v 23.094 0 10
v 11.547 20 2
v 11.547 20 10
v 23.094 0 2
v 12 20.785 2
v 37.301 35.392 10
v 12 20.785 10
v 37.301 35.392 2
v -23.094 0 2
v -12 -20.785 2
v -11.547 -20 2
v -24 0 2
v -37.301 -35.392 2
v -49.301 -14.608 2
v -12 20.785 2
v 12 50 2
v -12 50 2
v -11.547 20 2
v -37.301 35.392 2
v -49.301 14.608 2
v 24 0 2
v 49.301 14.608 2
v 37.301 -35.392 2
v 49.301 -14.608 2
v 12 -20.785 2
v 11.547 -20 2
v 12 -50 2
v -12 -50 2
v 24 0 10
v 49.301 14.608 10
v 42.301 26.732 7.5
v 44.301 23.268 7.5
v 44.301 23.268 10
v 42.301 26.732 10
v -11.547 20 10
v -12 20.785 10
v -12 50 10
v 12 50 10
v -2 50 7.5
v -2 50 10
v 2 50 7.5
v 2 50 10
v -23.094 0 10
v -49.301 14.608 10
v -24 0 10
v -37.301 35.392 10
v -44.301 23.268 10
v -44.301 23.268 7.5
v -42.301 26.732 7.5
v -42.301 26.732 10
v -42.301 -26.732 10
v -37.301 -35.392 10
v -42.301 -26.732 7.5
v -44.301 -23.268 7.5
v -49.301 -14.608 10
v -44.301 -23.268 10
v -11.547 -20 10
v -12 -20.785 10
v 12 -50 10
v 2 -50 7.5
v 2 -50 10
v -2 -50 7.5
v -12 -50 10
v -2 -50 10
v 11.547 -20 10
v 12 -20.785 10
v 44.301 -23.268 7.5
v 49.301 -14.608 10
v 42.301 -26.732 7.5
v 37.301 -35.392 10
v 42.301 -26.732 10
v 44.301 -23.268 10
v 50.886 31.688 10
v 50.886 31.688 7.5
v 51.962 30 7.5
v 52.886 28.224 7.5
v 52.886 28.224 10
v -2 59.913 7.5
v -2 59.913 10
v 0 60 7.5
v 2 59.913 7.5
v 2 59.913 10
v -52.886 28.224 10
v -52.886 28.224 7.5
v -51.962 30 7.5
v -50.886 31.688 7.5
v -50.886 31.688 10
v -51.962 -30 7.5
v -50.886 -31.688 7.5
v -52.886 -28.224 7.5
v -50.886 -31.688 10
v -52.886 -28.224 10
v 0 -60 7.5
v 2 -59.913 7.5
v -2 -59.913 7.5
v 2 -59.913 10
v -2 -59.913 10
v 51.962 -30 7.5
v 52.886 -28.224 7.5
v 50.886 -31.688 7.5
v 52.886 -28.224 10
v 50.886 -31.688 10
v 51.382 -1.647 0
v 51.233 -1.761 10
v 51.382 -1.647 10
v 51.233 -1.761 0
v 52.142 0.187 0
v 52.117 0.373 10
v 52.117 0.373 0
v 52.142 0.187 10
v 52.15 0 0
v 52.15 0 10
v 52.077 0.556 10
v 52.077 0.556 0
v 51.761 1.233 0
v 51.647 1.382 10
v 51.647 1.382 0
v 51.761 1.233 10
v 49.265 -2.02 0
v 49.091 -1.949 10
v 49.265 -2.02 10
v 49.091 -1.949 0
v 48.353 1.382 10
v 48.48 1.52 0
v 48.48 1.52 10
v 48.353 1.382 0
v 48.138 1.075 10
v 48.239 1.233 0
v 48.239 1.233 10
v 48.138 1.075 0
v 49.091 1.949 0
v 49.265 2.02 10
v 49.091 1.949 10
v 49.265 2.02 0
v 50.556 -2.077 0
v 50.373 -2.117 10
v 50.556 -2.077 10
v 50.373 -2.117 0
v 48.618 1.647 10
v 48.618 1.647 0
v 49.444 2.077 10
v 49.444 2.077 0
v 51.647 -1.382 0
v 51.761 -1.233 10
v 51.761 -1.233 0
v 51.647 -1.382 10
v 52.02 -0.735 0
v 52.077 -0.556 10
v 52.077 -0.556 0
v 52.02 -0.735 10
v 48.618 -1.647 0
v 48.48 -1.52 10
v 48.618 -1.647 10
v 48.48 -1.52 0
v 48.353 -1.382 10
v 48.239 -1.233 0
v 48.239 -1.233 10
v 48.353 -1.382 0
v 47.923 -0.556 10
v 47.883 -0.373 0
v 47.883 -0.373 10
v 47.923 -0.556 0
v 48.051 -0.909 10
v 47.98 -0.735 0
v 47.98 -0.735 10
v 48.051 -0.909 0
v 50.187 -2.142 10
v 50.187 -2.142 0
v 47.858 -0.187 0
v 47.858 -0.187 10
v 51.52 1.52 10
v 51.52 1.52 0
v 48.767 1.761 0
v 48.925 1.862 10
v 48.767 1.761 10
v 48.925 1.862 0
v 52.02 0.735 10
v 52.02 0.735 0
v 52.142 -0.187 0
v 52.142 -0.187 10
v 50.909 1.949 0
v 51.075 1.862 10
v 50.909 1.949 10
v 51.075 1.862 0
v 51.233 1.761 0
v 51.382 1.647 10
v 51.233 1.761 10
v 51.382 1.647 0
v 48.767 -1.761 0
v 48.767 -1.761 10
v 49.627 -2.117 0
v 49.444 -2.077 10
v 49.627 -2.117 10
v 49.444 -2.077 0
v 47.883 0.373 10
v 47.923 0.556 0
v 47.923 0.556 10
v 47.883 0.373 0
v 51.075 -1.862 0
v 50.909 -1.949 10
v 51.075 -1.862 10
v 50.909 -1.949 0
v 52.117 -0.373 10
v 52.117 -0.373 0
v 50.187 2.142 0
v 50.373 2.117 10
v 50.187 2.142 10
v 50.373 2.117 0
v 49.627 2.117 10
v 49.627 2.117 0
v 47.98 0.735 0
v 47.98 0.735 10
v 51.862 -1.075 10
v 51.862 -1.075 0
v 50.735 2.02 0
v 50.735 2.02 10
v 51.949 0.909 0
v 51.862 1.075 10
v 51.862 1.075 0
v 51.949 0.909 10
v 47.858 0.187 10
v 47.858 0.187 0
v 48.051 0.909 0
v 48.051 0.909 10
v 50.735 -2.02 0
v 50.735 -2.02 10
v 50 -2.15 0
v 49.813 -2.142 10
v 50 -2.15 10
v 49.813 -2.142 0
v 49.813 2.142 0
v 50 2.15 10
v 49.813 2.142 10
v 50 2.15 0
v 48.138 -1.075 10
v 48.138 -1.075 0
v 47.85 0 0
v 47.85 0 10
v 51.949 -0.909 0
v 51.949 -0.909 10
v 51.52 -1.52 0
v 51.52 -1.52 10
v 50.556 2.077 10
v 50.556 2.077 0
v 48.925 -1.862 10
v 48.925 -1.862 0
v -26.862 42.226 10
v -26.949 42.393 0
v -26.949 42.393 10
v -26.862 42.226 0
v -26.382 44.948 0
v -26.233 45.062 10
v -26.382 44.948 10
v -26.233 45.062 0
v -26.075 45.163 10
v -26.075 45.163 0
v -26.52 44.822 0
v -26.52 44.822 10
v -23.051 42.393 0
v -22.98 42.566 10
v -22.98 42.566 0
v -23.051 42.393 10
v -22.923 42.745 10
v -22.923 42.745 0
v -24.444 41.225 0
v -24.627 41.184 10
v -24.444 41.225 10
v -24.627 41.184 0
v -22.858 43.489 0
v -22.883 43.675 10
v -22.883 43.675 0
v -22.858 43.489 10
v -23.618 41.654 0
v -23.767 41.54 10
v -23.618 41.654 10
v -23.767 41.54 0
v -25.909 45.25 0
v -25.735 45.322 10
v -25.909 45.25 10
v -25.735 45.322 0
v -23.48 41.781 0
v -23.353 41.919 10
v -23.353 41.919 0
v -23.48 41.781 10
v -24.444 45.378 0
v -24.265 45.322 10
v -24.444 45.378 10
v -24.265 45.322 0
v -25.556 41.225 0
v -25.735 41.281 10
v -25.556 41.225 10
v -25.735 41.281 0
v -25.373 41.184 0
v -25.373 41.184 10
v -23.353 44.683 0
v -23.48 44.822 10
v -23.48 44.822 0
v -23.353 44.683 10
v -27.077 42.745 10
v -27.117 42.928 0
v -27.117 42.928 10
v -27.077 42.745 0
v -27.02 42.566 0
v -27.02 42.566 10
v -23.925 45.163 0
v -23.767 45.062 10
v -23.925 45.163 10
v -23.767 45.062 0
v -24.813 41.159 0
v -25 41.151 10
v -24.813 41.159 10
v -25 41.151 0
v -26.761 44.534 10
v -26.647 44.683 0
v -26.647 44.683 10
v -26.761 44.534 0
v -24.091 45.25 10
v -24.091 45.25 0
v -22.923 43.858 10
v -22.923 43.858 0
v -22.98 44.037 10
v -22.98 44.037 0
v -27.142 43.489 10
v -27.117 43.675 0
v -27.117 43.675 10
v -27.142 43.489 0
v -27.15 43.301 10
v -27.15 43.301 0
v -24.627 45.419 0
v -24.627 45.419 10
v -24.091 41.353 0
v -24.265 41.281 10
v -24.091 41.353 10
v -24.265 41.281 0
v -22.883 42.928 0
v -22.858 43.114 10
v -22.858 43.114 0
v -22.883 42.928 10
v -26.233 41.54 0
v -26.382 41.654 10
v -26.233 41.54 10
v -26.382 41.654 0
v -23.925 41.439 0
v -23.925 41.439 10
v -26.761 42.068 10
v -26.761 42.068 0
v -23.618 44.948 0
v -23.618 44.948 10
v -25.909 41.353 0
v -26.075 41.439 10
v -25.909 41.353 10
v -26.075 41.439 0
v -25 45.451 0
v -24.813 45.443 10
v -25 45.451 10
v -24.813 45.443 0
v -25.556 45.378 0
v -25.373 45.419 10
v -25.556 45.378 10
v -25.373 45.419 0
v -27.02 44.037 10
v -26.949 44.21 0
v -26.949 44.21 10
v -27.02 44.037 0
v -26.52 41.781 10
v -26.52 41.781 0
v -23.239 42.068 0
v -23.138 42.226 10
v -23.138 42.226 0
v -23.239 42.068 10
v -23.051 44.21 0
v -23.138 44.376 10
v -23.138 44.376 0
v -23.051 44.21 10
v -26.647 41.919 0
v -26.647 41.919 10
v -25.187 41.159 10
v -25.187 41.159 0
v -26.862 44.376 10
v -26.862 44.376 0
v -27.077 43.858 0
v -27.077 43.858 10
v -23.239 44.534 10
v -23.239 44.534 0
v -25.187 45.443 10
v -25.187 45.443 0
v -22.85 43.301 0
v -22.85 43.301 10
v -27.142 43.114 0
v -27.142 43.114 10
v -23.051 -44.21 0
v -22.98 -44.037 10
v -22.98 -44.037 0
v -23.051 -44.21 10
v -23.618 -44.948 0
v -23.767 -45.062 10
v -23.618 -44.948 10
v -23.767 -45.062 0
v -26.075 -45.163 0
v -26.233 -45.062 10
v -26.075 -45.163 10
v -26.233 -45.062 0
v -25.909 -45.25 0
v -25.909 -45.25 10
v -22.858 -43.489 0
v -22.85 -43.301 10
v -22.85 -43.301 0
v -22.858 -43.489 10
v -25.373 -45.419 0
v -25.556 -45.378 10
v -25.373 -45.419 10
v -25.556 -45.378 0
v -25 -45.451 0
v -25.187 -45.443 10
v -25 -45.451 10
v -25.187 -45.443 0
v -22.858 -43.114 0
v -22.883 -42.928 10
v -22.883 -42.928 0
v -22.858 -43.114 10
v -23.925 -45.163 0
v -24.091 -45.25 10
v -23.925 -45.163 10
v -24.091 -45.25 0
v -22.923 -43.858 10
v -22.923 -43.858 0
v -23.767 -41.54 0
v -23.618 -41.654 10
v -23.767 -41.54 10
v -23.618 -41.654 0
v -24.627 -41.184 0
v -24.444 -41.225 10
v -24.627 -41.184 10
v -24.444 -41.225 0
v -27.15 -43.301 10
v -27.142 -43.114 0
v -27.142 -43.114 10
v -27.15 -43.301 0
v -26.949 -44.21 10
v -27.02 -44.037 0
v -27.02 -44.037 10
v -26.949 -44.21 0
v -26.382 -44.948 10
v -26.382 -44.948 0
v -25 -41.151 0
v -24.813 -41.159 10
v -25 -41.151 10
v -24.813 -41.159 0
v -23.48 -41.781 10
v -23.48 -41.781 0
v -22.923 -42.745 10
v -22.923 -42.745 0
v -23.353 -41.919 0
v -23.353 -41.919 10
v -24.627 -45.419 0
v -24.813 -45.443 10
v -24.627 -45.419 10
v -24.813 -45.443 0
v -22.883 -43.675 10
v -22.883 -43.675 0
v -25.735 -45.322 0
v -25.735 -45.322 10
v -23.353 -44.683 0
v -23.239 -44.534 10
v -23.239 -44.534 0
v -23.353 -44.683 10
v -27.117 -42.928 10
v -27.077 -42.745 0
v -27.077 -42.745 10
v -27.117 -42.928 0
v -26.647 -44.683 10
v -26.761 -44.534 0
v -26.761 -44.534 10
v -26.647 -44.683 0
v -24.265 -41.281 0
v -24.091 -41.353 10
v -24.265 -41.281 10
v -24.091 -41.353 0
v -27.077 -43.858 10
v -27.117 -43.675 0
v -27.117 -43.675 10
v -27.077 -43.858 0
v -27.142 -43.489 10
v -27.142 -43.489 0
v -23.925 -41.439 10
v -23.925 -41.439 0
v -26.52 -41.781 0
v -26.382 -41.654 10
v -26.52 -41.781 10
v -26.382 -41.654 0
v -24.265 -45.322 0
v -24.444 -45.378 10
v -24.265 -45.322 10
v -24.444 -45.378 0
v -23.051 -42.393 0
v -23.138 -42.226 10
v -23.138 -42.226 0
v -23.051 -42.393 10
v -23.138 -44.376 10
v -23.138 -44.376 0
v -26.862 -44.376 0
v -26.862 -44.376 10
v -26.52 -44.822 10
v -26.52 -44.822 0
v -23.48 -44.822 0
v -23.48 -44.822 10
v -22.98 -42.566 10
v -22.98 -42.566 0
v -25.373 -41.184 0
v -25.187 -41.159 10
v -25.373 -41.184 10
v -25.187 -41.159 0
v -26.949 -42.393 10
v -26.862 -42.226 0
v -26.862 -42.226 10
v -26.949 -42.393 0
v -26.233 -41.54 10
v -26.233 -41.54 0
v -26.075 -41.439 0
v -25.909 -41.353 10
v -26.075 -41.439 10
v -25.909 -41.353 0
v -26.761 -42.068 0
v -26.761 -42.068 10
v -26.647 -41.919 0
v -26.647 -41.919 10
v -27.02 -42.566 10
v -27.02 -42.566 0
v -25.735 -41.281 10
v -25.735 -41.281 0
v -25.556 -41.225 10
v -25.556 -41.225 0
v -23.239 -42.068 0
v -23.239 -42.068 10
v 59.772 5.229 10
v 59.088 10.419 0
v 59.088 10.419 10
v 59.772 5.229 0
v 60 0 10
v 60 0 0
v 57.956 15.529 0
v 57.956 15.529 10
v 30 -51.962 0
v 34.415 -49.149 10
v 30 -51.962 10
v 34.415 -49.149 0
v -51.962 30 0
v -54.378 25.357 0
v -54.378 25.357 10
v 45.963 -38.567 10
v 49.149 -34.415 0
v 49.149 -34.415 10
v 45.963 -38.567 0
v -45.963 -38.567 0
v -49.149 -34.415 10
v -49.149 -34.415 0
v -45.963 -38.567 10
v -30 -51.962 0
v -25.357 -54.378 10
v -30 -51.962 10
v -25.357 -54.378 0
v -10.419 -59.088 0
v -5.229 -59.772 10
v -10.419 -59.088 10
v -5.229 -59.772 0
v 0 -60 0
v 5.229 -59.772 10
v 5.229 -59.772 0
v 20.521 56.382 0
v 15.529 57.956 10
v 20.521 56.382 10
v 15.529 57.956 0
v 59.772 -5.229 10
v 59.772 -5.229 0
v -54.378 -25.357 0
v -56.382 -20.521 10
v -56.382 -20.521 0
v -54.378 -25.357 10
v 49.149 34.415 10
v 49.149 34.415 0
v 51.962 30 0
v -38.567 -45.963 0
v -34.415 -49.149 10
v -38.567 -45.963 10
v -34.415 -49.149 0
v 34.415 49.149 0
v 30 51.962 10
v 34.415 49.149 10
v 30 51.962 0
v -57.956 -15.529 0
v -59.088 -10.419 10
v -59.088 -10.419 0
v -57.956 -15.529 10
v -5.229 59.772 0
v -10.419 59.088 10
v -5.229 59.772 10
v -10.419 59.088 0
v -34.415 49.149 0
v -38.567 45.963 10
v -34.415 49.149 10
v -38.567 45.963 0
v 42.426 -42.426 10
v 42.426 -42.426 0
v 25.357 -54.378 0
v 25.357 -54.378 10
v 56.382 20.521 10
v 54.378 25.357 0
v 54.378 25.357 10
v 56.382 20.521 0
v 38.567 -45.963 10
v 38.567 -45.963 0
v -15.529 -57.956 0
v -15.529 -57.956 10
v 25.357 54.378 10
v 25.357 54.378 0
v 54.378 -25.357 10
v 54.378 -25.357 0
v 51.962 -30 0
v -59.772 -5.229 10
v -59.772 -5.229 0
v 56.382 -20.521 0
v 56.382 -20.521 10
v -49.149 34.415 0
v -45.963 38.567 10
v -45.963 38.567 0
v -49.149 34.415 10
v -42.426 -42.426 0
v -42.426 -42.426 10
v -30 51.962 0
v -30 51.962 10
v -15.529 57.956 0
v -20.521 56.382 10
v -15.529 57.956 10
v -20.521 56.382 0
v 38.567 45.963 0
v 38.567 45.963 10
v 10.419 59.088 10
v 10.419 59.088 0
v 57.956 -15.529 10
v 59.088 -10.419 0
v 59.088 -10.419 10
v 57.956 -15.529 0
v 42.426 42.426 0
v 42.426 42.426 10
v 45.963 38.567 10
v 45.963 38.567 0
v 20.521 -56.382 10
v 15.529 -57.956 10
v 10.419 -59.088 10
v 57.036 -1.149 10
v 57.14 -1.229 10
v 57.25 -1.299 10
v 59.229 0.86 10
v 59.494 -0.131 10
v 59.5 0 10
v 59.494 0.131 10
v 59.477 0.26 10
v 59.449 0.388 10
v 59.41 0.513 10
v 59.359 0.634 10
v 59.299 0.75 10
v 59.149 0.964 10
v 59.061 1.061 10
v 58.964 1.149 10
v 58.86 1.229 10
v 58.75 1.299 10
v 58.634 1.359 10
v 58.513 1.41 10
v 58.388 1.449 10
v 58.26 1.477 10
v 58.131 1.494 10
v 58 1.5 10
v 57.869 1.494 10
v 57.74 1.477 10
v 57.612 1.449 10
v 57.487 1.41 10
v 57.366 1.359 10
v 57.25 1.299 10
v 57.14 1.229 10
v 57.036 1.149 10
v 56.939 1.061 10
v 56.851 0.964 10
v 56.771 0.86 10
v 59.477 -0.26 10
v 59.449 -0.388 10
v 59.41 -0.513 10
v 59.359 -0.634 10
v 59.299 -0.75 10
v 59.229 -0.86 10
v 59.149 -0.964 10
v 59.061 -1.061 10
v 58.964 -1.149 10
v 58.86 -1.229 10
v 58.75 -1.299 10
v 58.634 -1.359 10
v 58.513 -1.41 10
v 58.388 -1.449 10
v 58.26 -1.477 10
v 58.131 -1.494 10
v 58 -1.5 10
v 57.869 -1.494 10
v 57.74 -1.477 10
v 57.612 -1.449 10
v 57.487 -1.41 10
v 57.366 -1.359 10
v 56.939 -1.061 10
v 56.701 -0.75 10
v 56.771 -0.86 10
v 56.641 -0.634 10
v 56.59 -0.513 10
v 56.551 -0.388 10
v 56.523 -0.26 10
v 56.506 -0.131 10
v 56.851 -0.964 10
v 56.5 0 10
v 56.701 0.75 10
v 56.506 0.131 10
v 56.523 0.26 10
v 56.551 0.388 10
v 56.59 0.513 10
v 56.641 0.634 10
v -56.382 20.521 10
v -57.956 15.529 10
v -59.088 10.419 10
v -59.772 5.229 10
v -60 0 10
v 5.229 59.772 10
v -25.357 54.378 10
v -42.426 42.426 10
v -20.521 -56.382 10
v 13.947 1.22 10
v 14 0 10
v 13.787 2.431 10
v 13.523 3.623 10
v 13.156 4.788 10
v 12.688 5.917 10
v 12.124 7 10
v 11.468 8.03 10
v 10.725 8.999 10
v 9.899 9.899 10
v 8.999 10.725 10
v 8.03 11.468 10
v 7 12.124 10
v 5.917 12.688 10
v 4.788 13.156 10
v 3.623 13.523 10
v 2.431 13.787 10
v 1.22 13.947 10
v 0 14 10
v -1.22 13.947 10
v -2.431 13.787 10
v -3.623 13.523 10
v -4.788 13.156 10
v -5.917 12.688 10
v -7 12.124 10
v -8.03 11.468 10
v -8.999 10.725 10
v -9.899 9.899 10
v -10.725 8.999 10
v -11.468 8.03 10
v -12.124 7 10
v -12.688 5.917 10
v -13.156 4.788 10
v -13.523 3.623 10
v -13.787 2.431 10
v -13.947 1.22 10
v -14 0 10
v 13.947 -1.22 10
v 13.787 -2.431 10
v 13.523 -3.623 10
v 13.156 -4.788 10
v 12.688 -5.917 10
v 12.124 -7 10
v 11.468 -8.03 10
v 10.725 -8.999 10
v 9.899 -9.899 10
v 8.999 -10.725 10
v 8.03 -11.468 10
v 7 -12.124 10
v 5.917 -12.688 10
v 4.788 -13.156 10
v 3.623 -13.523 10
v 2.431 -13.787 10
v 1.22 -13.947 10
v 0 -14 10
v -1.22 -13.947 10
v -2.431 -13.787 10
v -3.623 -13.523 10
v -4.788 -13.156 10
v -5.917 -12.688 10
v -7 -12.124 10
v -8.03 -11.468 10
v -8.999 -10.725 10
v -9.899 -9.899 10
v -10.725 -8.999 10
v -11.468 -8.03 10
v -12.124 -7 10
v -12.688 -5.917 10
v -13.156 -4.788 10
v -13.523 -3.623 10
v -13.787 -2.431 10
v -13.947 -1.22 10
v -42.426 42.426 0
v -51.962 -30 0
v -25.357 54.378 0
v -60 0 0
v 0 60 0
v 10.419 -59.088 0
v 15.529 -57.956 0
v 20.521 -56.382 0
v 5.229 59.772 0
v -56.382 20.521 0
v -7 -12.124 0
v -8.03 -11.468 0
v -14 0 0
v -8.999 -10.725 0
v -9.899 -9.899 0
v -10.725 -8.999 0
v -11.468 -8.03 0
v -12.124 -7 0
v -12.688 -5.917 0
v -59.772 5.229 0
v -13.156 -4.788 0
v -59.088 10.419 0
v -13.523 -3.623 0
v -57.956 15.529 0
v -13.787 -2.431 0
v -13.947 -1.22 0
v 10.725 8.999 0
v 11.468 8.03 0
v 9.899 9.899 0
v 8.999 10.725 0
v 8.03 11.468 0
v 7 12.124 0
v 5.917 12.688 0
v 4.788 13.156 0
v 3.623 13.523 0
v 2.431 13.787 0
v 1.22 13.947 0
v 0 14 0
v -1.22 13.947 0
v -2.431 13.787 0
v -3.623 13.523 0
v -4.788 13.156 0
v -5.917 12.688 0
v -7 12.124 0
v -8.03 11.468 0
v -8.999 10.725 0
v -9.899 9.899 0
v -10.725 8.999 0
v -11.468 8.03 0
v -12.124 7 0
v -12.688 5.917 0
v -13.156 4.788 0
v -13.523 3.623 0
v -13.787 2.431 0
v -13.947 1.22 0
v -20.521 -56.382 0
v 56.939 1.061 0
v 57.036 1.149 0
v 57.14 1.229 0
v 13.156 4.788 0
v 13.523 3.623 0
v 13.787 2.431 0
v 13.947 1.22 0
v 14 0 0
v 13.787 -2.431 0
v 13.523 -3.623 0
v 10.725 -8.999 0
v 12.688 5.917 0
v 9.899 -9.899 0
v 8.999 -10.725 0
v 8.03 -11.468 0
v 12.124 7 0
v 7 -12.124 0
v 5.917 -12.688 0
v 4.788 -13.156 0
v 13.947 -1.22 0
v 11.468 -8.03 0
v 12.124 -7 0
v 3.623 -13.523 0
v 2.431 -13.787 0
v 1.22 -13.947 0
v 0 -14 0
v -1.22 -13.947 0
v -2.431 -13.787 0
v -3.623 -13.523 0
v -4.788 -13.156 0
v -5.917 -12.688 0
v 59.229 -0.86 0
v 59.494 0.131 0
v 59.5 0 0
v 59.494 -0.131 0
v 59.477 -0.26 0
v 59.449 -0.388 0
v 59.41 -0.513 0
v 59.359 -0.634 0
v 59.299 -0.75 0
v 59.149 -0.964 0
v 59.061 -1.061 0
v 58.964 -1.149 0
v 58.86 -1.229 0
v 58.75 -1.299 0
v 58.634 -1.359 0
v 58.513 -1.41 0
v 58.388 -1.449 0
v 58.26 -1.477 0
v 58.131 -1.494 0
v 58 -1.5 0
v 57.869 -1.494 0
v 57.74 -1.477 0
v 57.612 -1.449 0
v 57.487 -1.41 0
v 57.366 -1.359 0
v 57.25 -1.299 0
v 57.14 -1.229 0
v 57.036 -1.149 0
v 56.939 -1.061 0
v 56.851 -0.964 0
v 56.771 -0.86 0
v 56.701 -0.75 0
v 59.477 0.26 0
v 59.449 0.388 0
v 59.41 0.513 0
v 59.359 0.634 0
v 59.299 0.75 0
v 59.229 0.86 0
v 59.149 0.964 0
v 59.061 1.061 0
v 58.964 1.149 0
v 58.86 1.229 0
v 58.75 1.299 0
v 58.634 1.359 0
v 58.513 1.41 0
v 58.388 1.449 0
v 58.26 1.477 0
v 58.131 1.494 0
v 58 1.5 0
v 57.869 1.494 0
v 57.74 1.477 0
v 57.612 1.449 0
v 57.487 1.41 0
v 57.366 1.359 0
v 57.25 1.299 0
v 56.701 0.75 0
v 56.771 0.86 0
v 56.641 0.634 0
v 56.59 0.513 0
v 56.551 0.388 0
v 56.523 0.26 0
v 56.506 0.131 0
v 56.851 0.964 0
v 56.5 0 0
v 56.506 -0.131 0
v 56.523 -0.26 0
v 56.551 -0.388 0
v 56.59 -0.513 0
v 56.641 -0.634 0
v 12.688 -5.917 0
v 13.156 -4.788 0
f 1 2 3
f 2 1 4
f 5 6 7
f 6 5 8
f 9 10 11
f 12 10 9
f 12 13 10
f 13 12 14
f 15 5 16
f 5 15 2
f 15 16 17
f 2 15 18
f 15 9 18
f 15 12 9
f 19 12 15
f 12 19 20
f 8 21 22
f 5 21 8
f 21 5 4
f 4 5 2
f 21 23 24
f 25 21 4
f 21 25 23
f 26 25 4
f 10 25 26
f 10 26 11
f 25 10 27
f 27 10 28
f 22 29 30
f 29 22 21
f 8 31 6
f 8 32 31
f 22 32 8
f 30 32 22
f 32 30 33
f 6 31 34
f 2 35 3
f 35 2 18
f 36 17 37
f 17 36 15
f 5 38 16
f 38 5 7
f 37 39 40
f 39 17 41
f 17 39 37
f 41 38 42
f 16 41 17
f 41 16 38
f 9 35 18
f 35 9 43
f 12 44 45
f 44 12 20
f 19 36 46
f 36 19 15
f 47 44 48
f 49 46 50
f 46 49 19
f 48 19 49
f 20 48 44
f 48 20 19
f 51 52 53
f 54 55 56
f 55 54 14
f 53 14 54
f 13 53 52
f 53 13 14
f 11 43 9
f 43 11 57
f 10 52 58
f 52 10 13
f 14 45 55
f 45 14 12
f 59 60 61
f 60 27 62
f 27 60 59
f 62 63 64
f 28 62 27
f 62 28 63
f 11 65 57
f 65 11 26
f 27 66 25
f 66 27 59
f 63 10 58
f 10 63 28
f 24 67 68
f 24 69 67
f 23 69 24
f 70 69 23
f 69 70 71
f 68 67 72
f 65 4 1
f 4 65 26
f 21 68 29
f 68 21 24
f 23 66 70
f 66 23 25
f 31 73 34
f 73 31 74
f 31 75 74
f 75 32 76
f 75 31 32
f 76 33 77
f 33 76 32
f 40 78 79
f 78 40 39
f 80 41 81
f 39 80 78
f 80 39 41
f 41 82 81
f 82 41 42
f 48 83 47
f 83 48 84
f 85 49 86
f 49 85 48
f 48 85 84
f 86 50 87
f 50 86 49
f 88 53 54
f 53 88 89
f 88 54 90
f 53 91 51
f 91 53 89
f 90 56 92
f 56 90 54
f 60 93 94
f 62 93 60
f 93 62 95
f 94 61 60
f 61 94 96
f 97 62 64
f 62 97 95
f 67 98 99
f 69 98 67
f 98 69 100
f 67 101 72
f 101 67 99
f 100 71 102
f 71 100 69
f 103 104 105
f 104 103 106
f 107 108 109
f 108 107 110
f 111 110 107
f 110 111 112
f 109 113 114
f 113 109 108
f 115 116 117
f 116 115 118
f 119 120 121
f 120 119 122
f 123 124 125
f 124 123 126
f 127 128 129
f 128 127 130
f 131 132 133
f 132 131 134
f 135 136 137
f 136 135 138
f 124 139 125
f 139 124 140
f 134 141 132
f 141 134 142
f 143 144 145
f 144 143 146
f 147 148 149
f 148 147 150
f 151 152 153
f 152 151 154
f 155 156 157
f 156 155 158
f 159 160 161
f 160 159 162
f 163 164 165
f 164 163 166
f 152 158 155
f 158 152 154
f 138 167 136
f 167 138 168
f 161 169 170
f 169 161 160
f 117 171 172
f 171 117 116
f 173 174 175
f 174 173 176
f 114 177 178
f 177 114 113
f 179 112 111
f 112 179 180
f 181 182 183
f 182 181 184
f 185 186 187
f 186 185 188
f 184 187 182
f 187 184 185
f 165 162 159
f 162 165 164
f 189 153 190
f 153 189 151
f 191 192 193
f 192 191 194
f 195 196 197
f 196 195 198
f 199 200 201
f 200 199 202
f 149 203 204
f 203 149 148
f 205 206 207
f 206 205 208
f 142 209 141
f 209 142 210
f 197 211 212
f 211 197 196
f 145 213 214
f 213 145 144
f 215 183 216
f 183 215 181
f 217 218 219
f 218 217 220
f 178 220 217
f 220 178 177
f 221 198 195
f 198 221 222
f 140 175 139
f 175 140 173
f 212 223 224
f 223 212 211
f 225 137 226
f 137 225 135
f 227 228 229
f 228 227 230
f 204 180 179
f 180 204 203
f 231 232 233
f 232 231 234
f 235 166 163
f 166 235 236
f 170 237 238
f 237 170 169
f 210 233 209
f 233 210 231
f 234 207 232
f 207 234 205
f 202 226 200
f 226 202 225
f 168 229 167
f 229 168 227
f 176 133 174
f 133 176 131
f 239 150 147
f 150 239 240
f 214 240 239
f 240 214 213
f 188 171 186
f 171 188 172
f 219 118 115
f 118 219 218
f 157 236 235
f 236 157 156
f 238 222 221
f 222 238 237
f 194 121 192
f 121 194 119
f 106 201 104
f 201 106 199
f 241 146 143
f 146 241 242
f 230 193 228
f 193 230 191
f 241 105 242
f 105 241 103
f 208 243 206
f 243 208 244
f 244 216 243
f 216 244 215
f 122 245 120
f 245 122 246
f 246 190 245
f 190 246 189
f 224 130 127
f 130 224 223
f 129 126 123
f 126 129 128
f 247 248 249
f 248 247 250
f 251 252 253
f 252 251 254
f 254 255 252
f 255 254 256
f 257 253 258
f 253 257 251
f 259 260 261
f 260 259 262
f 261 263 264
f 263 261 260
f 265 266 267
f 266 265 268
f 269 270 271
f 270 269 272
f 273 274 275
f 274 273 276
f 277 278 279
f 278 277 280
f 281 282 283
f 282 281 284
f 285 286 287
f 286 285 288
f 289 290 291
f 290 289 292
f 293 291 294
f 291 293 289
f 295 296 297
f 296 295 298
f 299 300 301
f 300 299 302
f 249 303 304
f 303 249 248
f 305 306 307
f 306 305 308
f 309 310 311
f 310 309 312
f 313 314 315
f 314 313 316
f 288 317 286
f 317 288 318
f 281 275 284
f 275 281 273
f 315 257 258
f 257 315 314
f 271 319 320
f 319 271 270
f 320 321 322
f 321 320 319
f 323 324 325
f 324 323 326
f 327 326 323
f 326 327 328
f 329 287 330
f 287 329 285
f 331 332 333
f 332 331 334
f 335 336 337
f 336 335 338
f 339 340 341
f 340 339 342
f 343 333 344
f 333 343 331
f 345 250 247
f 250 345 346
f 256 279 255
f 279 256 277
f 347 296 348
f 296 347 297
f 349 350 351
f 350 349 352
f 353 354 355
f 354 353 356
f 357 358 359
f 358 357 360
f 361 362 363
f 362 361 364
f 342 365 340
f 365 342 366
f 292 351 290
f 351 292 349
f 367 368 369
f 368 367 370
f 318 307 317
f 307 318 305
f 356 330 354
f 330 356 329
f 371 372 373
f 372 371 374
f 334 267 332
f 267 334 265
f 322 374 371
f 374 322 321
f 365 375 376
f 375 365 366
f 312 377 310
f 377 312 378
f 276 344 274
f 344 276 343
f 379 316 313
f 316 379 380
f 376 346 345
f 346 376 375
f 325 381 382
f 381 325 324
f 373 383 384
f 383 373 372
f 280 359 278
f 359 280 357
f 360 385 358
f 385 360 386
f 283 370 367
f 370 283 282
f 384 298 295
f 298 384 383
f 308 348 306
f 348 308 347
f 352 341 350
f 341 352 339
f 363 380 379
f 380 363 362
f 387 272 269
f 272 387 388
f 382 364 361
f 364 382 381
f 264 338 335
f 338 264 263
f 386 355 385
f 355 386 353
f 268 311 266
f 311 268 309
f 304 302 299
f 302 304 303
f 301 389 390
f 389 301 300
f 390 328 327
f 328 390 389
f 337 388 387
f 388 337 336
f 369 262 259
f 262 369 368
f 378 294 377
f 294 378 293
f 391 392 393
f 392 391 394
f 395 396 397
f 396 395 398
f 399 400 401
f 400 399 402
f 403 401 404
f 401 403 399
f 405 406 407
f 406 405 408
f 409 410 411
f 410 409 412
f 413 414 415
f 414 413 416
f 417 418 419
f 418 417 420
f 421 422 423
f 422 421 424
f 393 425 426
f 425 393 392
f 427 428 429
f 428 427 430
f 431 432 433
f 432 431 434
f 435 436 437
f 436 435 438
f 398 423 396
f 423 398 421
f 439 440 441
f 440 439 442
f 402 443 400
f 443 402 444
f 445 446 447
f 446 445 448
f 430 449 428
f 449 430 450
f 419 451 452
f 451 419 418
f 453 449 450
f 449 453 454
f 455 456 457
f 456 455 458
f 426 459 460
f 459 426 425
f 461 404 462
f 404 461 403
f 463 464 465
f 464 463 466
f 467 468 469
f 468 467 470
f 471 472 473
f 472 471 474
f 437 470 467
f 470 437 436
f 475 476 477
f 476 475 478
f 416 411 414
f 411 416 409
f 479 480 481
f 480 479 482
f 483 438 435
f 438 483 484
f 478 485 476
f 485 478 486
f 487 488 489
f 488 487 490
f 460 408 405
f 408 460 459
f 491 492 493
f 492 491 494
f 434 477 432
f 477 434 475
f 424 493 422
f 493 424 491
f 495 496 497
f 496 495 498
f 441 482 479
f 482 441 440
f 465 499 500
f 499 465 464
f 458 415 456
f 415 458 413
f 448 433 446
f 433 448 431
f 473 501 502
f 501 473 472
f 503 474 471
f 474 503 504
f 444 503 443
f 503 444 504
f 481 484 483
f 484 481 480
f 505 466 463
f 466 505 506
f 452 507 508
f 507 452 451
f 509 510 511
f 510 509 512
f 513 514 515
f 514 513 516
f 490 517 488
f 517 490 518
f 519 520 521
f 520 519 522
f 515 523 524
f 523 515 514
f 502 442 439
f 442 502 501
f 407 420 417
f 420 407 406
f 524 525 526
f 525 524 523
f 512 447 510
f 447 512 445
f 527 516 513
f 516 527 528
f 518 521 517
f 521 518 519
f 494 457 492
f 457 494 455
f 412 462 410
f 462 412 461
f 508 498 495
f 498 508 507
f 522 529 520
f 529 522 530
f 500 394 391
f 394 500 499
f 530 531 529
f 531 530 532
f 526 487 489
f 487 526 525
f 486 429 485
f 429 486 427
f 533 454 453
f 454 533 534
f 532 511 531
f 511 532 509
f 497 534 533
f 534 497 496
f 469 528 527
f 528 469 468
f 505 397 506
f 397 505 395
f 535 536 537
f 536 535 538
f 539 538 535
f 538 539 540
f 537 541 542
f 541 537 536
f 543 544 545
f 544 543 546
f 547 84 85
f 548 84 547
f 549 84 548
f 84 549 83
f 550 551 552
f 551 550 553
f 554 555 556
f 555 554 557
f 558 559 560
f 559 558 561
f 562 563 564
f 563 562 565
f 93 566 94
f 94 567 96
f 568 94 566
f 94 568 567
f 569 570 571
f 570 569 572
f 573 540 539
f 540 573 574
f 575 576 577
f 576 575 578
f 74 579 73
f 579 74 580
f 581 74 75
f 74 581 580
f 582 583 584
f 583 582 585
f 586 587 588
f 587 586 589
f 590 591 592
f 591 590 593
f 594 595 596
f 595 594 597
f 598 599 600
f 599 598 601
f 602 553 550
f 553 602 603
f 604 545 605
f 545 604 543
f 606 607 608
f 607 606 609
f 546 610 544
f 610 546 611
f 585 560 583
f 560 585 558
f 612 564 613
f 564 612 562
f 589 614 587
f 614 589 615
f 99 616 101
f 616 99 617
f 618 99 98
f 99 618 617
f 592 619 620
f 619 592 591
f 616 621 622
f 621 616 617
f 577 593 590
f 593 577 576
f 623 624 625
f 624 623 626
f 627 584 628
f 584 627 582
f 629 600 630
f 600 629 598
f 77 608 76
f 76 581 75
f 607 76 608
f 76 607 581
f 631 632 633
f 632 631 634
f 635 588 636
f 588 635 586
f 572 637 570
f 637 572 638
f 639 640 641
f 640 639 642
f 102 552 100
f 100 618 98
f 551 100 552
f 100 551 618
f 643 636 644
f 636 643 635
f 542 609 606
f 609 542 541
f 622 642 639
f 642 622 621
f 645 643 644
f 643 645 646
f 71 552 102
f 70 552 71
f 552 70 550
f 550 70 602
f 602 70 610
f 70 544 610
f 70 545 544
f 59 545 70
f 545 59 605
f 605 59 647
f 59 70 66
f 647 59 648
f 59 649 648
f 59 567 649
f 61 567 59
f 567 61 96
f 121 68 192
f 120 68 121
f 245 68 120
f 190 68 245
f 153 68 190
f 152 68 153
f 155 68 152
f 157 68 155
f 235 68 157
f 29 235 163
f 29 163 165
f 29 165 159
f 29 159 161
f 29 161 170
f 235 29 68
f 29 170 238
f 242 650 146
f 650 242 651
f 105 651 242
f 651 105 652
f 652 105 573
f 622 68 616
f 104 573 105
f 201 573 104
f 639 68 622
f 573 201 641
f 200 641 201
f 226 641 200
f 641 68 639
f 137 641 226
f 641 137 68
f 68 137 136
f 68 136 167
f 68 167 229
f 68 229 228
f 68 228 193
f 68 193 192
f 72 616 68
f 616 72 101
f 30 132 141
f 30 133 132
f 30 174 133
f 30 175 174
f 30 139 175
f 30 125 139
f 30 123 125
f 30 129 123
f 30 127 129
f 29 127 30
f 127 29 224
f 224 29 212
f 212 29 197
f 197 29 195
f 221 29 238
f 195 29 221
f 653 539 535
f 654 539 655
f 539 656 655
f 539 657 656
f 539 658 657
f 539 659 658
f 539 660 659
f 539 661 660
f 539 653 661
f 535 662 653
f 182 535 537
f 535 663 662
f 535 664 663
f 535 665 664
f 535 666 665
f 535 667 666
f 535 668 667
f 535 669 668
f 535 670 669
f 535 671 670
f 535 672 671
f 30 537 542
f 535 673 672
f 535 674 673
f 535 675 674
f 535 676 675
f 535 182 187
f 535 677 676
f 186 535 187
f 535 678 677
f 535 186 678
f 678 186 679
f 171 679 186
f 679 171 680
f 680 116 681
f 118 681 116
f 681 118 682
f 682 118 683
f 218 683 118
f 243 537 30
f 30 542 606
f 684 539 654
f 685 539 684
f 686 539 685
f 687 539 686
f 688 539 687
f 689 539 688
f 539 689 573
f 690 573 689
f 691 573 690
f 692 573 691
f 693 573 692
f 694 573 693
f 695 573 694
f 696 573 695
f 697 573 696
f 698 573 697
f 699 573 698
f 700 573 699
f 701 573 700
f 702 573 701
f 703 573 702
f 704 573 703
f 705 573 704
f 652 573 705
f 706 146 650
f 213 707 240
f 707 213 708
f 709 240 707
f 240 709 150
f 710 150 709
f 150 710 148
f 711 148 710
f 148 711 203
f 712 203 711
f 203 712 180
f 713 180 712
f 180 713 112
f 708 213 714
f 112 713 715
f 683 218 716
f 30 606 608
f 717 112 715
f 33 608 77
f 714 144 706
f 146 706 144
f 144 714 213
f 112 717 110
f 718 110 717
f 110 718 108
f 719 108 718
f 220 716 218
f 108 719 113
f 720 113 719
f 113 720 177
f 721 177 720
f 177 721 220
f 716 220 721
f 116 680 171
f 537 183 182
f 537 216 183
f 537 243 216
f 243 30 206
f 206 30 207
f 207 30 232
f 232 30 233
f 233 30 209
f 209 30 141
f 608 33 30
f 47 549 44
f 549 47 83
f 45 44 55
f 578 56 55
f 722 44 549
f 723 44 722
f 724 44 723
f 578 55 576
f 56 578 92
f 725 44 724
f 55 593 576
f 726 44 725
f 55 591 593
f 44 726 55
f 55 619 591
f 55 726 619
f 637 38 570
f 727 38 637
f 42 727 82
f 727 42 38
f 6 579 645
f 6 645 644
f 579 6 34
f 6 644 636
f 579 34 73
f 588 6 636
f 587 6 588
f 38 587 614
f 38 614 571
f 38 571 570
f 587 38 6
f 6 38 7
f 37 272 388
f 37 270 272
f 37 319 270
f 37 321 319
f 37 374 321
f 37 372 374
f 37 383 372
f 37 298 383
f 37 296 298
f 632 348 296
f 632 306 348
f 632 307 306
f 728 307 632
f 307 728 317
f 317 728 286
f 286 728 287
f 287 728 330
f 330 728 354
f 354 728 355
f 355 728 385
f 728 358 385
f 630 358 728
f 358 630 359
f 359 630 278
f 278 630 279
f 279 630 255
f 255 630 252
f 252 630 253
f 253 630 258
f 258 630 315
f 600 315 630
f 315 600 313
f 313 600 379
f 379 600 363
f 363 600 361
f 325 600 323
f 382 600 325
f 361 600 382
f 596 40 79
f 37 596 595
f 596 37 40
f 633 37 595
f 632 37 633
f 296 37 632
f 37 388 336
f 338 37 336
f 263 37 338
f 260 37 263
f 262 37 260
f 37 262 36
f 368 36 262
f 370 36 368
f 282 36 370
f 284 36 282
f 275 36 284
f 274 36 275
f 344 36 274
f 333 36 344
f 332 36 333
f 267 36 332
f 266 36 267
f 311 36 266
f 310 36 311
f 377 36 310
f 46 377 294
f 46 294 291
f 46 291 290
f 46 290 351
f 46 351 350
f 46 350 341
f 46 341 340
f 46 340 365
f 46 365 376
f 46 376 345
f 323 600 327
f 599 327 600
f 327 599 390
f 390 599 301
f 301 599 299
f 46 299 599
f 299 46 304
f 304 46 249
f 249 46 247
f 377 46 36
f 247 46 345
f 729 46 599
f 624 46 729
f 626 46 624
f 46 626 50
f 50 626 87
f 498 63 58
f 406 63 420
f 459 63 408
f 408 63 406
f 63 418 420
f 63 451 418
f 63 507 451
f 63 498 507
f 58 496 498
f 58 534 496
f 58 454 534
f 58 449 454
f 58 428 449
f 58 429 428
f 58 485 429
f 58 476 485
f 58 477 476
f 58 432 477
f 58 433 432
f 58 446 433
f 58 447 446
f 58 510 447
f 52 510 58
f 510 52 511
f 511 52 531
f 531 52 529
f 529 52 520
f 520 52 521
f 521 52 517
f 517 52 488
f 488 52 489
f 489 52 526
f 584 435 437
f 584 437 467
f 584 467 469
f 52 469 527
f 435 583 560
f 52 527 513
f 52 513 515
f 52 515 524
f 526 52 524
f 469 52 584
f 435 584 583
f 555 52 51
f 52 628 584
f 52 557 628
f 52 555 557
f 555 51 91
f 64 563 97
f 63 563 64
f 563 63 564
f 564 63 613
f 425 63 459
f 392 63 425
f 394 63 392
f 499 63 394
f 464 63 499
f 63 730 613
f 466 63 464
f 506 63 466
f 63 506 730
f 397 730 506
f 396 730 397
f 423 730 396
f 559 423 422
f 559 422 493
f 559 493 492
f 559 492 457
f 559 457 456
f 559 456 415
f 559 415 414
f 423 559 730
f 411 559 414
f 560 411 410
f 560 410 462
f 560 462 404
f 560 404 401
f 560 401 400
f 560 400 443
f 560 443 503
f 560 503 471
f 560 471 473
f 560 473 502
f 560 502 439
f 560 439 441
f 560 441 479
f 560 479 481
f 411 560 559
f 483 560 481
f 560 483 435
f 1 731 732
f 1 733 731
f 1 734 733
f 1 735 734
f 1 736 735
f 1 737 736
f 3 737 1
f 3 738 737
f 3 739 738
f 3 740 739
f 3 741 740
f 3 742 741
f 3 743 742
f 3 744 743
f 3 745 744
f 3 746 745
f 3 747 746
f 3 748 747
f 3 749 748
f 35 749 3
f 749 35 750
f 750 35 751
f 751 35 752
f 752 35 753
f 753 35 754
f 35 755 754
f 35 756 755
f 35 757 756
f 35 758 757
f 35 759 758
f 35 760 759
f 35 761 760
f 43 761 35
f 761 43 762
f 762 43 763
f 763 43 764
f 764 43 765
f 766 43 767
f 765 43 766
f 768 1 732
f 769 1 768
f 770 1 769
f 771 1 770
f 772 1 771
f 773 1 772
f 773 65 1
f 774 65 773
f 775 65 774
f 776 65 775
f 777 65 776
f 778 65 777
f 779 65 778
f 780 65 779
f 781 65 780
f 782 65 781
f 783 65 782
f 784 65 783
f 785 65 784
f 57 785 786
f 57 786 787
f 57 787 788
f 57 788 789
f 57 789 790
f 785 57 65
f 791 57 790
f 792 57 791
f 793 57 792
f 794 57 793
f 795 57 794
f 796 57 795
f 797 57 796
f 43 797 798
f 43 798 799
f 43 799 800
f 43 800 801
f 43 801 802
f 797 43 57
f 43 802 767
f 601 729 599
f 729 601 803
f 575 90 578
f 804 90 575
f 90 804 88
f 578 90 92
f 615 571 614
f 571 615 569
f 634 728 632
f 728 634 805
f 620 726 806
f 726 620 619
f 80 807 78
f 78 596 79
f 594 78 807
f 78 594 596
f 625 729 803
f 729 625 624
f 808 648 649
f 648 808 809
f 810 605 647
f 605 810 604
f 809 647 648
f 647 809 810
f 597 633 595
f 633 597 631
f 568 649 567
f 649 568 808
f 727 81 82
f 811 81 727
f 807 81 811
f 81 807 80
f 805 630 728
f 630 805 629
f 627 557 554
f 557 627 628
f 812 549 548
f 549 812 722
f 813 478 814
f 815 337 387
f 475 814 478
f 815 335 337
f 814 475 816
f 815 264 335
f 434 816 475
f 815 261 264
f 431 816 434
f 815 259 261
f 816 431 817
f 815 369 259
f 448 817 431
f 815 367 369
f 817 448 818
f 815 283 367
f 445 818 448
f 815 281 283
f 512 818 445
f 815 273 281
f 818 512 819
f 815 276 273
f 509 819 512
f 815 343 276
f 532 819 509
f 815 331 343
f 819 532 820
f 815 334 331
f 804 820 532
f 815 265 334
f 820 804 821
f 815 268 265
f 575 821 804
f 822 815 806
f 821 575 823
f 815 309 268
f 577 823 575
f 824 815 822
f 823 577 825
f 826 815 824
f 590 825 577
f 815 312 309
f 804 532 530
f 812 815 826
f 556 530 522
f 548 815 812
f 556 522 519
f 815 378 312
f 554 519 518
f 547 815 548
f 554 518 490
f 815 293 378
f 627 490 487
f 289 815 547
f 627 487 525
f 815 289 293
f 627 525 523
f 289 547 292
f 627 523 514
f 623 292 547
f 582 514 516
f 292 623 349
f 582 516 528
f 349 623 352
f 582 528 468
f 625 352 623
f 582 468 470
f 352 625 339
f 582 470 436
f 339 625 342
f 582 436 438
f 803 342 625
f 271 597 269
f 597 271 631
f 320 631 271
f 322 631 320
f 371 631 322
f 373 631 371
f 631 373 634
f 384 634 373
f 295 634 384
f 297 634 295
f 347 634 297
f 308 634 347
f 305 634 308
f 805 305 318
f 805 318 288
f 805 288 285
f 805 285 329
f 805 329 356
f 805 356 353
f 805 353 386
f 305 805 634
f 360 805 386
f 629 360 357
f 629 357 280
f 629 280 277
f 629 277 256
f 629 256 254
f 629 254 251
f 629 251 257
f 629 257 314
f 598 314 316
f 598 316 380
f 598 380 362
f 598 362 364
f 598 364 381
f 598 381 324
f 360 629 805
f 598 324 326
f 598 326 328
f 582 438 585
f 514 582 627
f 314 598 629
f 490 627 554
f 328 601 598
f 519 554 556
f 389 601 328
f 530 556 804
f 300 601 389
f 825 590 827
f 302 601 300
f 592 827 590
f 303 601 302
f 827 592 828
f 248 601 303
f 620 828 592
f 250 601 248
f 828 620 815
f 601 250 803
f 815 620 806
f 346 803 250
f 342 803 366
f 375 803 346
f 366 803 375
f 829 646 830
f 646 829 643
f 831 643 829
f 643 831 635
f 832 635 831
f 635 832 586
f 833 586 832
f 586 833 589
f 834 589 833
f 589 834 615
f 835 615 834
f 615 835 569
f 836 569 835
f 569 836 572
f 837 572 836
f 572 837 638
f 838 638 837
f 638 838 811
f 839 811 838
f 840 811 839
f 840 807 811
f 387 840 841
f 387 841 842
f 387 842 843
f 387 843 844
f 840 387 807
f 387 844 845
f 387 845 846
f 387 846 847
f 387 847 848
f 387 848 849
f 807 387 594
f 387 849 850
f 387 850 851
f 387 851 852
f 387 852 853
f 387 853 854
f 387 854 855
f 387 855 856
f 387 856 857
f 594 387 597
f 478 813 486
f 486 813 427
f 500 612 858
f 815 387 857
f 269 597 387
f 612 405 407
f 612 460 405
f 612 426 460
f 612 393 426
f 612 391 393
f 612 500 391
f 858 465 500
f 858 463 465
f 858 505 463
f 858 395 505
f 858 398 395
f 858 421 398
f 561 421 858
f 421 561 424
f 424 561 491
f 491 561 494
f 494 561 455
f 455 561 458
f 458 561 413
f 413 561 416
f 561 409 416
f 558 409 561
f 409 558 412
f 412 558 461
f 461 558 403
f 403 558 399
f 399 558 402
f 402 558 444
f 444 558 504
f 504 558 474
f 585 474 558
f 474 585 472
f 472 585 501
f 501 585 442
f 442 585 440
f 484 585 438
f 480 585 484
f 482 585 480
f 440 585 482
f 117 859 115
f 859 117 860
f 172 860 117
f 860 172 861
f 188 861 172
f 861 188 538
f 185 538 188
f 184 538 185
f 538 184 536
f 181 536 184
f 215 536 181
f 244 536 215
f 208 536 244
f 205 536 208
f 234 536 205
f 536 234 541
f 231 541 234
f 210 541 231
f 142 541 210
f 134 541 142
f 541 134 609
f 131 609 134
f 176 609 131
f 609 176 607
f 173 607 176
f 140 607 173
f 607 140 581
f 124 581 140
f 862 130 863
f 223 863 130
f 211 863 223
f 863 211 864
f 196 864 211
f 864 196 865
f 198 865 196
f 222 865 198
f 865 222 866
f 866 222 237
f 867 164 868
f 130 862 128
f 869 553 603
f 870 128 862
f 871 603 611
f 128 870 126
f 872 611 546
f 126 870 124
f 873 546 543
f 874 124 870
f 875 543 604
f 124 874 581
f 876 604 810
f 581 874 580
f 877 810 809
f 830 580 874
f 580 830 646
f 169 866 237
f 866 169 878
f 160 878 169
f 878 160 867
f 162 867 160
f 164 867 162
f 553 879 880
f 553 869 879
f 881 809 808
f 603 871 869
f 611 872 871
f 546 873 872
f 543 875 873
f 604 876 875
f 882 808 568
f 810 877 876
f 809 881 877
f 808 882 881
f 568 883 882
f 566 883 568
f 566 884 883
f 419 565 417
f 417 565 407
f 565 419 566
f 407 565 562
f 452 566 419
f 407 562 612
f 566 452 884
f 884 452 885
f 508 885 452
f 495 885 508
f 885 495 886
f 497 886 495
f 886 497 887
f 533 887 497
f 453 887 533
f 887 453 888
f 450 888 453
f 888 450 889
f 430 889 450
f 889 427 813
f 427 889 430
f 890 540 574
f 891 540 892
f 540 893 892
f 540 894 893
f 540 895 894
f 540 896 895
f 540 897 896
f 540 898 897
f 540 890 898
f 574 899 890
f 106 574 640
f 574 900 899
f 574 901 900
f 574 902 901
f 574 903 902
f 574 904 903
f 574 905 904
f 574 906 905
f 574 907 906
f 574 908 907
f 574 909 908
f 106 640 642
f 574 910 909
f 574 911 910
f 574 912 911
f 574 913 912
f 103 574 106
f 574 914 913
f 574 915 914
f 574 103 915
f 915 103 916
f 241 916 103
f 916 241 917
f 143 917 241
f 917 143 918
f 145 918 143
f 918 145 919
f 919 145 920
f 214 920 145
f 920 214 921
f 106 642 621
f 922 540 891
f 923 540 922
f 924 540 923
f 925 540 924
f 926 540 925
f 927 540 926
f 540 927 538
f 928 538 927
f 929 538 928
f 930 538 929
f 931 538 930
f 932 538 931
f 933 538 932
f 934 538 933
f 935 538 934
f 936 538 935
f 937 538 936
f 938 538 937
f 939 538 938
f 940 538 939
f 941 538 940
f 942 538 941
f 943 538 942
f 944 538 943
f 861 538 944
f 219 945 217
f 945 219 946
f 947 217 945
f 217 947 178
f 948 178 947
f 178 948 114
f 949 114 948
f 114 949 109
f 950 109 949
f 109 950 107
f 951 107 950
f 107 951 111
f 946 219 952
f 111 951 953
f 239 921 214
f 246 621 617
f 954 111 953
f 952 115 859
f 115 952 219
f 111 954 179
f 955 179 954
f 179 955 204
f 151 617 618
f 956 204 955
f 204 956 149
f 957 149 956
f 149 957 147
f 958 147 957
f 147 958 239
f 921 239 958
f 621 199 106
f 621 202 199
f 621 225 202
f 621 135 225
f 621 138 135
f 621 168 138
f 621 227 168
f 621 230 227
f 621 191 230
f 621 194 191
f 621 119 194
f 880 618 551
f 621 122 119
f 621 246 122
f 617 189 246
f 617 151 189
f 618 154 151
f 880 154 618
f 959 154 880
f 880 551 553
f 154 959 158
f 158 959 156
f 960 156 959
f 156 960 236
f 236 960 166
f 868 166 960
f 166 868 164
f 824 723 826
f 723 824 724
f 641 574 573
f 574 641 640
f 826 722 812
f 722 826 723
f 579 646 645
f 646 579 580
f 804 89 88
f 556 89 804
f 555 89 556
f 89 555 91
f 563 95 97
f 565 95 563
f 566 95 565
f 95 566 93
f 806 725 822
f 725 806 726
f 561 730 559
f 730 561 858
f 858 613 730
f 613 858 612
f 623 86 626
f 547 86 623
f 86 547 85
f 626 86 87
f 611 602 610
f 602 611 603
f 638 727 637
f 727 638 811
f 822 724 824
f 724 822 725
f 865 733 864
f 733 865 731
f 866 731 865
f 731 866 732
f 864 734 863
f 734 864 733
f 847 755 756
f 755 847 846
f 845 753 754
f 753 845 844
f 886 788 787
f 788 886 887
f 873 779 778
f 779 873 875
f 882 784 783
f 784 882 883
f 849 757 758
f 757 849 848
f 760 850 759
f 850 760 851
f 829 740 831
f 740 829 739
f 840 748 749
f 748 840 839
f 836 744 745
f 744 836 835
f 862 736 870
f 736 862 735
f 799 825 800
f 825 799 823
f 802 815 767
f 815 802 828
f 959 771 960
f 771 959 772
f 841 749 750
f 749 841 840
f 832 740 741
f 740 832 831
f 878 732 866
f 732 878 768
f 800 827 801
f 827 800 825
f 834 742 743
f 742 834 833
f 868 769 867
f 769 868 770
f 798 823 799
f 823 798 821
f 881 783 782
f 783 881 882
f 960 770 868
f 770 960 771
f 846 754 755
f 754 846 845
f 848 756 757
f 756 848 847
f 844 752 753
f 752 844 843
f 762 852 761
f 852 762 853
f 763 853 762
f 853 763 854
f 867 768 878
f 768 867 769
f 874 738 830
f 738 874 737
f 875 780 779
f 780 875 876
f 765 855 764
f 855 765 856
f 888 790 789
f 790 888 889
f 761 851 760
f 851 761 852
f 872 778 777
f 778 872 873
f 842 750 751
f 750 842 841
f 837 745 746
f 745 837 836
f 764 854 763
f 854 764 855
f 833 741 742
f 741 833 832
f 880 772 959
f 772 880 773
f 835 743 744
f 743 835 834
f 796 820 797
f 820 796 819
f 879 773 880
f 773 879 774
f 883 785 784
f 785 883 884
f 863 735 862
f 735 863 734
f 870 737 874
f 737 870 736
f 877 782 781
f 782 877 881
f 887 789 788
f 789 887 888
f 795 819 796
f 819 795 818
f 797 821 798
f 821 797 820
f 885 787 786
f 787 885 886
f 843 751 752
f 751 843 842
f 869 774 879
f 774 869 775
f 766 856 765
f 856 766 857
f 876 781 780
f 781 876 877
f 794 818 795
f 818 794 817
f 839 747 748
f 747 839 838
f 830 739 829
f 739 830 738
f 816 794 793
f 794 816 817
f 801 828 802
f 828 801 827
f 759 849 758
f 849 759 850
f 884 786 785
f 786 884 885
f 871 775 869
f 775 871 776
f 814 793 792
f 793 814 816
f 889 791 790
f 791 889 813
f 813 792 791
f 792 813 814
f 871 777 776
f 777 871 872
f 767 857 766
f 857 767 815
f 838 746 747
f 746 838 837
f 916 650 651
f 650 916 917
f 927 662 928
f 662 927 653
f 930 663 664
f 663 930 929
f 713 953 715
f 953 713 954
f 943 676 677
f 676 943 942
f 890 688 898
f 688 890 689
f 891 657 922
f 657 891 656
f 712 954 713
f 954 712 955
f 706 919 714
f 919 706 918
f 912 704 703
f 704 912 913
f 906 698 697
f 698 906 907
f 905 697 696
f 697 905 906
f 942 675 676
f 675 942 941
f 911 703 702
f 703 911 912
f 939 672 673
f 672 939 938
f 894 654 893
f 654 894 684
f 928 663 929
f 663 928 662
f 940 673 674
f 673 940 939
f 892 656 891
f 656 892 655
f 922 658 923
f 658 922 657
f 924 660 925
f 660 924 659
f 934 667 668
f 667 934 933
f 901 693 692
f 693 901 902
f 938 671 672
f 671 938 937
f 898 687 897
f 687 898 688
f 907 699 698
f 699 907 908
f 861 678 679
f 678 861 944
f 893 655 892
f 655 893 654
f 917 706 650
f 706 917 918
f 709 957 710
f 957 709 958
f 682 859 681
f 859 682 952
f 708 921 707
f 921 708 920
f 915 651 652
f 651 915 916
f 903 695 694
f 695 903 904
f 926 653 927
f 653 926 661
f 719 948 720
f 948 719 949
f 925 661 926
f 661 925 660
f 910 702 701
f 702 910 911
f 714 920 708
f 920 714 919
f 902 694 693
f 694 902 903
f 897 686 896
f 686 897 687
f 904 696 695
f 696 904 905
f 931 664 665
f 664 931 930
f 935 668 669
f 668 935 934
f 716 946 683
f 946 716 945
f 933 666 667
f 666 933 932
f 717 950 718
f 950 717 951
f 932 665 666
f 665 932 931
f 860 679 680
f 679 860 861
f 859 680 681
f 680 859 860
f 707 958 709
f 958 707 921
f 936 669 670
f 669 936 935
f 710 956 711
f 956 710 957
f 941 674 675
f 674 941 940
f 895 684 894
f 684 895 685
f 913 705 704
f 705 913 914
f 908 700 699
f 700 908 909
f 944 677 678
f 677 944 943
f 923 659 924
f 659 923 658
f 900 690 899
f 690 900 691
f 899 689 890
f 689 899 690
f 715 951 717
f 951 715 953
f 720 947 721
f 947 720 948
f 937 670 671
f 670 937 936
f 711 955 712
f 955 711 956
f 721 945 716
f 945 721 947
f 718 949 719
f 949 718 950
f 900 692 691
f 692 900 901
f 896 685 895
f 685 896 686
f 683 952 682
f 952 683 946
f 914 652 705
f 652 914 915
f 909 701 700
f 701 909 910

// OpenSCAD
// file: parameters.scad
// AFPM-Desk-v2 shared parameters (mm)
// Dual-rotor axial-flux PM learning generator with steel back-iron.
// Faraday induction education only — not free-energy / overunity.
// Target printer: Anycubic Kobra 3 Max, 0.4 mm nozzle, 0.2 mm layers, PLA/PETG.

$fn = 72;

// --- Printer / FDM assumptions ---
nozzle = 0.4;
layer = 0.2;
wall = 1.6;                 // load-bearing walls ~4 perimeters
housing_wall = 2.4;
clearance_slip = 0.35;      // shaft slip fit
clearance_loose = 0.55;
press_interference = 0.15;  // bearing pocket undersize total (coupon-test)
magnet_pocket_xy = 0.25;    // +0.25 mm on diameter
magnet_pocket_z = 0.15;     // +0.15 mm depth
elephant_foot = 0.5;

// --- Magnets (N42 Neo discs) ---
magnet_d = 20;
magnet_h = 3;
magnet_count = 8;           // per rotor (8+8 total)
magnet_pcd = 70;

// --- Steel back-iron (purchased mild steel disc) ---
steel_od = 100;
steel_id = 14;              // clearance around hub boss
steel_h = 1.5;              // 1.5–2.0 mm mild steel OK
steel_recess_clearance = 0.3;

// --- Rotor printed disc ---
rotor_od = 110;
rotor_hub_bore = 12;        // seats on shaft_hub boss
rotor_thickness = 7;        // magnet pocket from face; steel recess on back
magnet_pocket_depth = magnet_h + magnet_pocket_z;
steel_recess_depth = steel_h + 0.2;

// --- Stator (coreless, between rotors) ---
stator_od = 120;
stator_id = 28;
stator_thickness = 10;
coil_count = 6;
coil_slot_w = 24;
coil_slot_l = 30;           // radial length of pocket
coil_slot_depth = 8;
coil_pcd = 70;
stator_pillar_pcd = 100;    // M4 pillar holes

// --- Coil former / bobbin ---
former_core_w = 14;
former_core_l = 26;
former_flange = 3;
former_wind_h = 11;
former_bore = 0;            // solid core, split design via kerf

// --- Shaft / bearings ---
shaft_d = 8;
bearing_od = 22;            // 608-2RS
bearing_id = 8;
bearing_h = 7;
bearing_seat_od = bearing_od - press_interference; // coupon-test; start ~21.85

// --- Base / frame ---
base_w = 180;
base_d = 160;
base_h = 8;
post_h = 70;
post_spacing = 120;         // Y distance between bearing post centers
post_d = 36;

// --- Axial stack targets (along shaft / Y) ---
// crank | brg | hub+rotorA+steel | air | stator | air | steel+rotorB+hub | brg
air_gap_nominal = 2.0;      // mechanical per side magnet↔coil face

// --- Crank ---
crank_arm_len = 85;
crank_arm_w = 18;
crank_arm_t = 10;
handle_d = 14;
handle_len = 45;

// --- Electronics tray ---
tray_w = 75;
tray_d = 55;
tray_h = 14;

// --- Fasteners ---
m3_clear = 3.4;
m3_tap = 2.5;
m4_clear = 4.3;
// main file
include <parameters.scad>

module stator_plate() {
  floor_t = stator_thickness - coil_slot_depth; // ~2 mm
  difference() {
    cylinder(h=stator_thickness, d=stator_od);

    translate([0,0,-0.1])
      cylinder(h=stator_thickness+0.2, d=stator_id);

    // coil pockets — cut from top down, leave floor
    for (i = [0:coil_count-1]) {
      angle = i * 360 / coil_count + 30;
      rotate([0,0,angle])
        translate([coil_pcd/2 - coil_slot_l/2, -coil_slot_w/2, floor_t])
          cube([coil_slot_l, coil_slot_w, coil_slot_depth + 0.2]);
    }

    // wire exit channels
    for (i = [0:coil_count-1]) {
      angle = i * 360 / coil_count + 30;
      rotate([0,0,angle])
        translate([stator_od/2 - 12, -2, stator_thickness - 2.5])
          cube([16, 4, 3]);
    }

    // M4 pillar holes
    for (a = [0,120,240]) {
      rotate([0,0,a])
        translate([stator_pillar_pcd/2, 0, -0.1])
          cylinder(h=stator_thickness+0.2, d=m4_clear);
    }

    // index notch
    translate([stator_od/2 - 2, 0, -0.1])
      cylinder(h=stator_thickness+0.2, d=3);
  }
}

stator_plate();
